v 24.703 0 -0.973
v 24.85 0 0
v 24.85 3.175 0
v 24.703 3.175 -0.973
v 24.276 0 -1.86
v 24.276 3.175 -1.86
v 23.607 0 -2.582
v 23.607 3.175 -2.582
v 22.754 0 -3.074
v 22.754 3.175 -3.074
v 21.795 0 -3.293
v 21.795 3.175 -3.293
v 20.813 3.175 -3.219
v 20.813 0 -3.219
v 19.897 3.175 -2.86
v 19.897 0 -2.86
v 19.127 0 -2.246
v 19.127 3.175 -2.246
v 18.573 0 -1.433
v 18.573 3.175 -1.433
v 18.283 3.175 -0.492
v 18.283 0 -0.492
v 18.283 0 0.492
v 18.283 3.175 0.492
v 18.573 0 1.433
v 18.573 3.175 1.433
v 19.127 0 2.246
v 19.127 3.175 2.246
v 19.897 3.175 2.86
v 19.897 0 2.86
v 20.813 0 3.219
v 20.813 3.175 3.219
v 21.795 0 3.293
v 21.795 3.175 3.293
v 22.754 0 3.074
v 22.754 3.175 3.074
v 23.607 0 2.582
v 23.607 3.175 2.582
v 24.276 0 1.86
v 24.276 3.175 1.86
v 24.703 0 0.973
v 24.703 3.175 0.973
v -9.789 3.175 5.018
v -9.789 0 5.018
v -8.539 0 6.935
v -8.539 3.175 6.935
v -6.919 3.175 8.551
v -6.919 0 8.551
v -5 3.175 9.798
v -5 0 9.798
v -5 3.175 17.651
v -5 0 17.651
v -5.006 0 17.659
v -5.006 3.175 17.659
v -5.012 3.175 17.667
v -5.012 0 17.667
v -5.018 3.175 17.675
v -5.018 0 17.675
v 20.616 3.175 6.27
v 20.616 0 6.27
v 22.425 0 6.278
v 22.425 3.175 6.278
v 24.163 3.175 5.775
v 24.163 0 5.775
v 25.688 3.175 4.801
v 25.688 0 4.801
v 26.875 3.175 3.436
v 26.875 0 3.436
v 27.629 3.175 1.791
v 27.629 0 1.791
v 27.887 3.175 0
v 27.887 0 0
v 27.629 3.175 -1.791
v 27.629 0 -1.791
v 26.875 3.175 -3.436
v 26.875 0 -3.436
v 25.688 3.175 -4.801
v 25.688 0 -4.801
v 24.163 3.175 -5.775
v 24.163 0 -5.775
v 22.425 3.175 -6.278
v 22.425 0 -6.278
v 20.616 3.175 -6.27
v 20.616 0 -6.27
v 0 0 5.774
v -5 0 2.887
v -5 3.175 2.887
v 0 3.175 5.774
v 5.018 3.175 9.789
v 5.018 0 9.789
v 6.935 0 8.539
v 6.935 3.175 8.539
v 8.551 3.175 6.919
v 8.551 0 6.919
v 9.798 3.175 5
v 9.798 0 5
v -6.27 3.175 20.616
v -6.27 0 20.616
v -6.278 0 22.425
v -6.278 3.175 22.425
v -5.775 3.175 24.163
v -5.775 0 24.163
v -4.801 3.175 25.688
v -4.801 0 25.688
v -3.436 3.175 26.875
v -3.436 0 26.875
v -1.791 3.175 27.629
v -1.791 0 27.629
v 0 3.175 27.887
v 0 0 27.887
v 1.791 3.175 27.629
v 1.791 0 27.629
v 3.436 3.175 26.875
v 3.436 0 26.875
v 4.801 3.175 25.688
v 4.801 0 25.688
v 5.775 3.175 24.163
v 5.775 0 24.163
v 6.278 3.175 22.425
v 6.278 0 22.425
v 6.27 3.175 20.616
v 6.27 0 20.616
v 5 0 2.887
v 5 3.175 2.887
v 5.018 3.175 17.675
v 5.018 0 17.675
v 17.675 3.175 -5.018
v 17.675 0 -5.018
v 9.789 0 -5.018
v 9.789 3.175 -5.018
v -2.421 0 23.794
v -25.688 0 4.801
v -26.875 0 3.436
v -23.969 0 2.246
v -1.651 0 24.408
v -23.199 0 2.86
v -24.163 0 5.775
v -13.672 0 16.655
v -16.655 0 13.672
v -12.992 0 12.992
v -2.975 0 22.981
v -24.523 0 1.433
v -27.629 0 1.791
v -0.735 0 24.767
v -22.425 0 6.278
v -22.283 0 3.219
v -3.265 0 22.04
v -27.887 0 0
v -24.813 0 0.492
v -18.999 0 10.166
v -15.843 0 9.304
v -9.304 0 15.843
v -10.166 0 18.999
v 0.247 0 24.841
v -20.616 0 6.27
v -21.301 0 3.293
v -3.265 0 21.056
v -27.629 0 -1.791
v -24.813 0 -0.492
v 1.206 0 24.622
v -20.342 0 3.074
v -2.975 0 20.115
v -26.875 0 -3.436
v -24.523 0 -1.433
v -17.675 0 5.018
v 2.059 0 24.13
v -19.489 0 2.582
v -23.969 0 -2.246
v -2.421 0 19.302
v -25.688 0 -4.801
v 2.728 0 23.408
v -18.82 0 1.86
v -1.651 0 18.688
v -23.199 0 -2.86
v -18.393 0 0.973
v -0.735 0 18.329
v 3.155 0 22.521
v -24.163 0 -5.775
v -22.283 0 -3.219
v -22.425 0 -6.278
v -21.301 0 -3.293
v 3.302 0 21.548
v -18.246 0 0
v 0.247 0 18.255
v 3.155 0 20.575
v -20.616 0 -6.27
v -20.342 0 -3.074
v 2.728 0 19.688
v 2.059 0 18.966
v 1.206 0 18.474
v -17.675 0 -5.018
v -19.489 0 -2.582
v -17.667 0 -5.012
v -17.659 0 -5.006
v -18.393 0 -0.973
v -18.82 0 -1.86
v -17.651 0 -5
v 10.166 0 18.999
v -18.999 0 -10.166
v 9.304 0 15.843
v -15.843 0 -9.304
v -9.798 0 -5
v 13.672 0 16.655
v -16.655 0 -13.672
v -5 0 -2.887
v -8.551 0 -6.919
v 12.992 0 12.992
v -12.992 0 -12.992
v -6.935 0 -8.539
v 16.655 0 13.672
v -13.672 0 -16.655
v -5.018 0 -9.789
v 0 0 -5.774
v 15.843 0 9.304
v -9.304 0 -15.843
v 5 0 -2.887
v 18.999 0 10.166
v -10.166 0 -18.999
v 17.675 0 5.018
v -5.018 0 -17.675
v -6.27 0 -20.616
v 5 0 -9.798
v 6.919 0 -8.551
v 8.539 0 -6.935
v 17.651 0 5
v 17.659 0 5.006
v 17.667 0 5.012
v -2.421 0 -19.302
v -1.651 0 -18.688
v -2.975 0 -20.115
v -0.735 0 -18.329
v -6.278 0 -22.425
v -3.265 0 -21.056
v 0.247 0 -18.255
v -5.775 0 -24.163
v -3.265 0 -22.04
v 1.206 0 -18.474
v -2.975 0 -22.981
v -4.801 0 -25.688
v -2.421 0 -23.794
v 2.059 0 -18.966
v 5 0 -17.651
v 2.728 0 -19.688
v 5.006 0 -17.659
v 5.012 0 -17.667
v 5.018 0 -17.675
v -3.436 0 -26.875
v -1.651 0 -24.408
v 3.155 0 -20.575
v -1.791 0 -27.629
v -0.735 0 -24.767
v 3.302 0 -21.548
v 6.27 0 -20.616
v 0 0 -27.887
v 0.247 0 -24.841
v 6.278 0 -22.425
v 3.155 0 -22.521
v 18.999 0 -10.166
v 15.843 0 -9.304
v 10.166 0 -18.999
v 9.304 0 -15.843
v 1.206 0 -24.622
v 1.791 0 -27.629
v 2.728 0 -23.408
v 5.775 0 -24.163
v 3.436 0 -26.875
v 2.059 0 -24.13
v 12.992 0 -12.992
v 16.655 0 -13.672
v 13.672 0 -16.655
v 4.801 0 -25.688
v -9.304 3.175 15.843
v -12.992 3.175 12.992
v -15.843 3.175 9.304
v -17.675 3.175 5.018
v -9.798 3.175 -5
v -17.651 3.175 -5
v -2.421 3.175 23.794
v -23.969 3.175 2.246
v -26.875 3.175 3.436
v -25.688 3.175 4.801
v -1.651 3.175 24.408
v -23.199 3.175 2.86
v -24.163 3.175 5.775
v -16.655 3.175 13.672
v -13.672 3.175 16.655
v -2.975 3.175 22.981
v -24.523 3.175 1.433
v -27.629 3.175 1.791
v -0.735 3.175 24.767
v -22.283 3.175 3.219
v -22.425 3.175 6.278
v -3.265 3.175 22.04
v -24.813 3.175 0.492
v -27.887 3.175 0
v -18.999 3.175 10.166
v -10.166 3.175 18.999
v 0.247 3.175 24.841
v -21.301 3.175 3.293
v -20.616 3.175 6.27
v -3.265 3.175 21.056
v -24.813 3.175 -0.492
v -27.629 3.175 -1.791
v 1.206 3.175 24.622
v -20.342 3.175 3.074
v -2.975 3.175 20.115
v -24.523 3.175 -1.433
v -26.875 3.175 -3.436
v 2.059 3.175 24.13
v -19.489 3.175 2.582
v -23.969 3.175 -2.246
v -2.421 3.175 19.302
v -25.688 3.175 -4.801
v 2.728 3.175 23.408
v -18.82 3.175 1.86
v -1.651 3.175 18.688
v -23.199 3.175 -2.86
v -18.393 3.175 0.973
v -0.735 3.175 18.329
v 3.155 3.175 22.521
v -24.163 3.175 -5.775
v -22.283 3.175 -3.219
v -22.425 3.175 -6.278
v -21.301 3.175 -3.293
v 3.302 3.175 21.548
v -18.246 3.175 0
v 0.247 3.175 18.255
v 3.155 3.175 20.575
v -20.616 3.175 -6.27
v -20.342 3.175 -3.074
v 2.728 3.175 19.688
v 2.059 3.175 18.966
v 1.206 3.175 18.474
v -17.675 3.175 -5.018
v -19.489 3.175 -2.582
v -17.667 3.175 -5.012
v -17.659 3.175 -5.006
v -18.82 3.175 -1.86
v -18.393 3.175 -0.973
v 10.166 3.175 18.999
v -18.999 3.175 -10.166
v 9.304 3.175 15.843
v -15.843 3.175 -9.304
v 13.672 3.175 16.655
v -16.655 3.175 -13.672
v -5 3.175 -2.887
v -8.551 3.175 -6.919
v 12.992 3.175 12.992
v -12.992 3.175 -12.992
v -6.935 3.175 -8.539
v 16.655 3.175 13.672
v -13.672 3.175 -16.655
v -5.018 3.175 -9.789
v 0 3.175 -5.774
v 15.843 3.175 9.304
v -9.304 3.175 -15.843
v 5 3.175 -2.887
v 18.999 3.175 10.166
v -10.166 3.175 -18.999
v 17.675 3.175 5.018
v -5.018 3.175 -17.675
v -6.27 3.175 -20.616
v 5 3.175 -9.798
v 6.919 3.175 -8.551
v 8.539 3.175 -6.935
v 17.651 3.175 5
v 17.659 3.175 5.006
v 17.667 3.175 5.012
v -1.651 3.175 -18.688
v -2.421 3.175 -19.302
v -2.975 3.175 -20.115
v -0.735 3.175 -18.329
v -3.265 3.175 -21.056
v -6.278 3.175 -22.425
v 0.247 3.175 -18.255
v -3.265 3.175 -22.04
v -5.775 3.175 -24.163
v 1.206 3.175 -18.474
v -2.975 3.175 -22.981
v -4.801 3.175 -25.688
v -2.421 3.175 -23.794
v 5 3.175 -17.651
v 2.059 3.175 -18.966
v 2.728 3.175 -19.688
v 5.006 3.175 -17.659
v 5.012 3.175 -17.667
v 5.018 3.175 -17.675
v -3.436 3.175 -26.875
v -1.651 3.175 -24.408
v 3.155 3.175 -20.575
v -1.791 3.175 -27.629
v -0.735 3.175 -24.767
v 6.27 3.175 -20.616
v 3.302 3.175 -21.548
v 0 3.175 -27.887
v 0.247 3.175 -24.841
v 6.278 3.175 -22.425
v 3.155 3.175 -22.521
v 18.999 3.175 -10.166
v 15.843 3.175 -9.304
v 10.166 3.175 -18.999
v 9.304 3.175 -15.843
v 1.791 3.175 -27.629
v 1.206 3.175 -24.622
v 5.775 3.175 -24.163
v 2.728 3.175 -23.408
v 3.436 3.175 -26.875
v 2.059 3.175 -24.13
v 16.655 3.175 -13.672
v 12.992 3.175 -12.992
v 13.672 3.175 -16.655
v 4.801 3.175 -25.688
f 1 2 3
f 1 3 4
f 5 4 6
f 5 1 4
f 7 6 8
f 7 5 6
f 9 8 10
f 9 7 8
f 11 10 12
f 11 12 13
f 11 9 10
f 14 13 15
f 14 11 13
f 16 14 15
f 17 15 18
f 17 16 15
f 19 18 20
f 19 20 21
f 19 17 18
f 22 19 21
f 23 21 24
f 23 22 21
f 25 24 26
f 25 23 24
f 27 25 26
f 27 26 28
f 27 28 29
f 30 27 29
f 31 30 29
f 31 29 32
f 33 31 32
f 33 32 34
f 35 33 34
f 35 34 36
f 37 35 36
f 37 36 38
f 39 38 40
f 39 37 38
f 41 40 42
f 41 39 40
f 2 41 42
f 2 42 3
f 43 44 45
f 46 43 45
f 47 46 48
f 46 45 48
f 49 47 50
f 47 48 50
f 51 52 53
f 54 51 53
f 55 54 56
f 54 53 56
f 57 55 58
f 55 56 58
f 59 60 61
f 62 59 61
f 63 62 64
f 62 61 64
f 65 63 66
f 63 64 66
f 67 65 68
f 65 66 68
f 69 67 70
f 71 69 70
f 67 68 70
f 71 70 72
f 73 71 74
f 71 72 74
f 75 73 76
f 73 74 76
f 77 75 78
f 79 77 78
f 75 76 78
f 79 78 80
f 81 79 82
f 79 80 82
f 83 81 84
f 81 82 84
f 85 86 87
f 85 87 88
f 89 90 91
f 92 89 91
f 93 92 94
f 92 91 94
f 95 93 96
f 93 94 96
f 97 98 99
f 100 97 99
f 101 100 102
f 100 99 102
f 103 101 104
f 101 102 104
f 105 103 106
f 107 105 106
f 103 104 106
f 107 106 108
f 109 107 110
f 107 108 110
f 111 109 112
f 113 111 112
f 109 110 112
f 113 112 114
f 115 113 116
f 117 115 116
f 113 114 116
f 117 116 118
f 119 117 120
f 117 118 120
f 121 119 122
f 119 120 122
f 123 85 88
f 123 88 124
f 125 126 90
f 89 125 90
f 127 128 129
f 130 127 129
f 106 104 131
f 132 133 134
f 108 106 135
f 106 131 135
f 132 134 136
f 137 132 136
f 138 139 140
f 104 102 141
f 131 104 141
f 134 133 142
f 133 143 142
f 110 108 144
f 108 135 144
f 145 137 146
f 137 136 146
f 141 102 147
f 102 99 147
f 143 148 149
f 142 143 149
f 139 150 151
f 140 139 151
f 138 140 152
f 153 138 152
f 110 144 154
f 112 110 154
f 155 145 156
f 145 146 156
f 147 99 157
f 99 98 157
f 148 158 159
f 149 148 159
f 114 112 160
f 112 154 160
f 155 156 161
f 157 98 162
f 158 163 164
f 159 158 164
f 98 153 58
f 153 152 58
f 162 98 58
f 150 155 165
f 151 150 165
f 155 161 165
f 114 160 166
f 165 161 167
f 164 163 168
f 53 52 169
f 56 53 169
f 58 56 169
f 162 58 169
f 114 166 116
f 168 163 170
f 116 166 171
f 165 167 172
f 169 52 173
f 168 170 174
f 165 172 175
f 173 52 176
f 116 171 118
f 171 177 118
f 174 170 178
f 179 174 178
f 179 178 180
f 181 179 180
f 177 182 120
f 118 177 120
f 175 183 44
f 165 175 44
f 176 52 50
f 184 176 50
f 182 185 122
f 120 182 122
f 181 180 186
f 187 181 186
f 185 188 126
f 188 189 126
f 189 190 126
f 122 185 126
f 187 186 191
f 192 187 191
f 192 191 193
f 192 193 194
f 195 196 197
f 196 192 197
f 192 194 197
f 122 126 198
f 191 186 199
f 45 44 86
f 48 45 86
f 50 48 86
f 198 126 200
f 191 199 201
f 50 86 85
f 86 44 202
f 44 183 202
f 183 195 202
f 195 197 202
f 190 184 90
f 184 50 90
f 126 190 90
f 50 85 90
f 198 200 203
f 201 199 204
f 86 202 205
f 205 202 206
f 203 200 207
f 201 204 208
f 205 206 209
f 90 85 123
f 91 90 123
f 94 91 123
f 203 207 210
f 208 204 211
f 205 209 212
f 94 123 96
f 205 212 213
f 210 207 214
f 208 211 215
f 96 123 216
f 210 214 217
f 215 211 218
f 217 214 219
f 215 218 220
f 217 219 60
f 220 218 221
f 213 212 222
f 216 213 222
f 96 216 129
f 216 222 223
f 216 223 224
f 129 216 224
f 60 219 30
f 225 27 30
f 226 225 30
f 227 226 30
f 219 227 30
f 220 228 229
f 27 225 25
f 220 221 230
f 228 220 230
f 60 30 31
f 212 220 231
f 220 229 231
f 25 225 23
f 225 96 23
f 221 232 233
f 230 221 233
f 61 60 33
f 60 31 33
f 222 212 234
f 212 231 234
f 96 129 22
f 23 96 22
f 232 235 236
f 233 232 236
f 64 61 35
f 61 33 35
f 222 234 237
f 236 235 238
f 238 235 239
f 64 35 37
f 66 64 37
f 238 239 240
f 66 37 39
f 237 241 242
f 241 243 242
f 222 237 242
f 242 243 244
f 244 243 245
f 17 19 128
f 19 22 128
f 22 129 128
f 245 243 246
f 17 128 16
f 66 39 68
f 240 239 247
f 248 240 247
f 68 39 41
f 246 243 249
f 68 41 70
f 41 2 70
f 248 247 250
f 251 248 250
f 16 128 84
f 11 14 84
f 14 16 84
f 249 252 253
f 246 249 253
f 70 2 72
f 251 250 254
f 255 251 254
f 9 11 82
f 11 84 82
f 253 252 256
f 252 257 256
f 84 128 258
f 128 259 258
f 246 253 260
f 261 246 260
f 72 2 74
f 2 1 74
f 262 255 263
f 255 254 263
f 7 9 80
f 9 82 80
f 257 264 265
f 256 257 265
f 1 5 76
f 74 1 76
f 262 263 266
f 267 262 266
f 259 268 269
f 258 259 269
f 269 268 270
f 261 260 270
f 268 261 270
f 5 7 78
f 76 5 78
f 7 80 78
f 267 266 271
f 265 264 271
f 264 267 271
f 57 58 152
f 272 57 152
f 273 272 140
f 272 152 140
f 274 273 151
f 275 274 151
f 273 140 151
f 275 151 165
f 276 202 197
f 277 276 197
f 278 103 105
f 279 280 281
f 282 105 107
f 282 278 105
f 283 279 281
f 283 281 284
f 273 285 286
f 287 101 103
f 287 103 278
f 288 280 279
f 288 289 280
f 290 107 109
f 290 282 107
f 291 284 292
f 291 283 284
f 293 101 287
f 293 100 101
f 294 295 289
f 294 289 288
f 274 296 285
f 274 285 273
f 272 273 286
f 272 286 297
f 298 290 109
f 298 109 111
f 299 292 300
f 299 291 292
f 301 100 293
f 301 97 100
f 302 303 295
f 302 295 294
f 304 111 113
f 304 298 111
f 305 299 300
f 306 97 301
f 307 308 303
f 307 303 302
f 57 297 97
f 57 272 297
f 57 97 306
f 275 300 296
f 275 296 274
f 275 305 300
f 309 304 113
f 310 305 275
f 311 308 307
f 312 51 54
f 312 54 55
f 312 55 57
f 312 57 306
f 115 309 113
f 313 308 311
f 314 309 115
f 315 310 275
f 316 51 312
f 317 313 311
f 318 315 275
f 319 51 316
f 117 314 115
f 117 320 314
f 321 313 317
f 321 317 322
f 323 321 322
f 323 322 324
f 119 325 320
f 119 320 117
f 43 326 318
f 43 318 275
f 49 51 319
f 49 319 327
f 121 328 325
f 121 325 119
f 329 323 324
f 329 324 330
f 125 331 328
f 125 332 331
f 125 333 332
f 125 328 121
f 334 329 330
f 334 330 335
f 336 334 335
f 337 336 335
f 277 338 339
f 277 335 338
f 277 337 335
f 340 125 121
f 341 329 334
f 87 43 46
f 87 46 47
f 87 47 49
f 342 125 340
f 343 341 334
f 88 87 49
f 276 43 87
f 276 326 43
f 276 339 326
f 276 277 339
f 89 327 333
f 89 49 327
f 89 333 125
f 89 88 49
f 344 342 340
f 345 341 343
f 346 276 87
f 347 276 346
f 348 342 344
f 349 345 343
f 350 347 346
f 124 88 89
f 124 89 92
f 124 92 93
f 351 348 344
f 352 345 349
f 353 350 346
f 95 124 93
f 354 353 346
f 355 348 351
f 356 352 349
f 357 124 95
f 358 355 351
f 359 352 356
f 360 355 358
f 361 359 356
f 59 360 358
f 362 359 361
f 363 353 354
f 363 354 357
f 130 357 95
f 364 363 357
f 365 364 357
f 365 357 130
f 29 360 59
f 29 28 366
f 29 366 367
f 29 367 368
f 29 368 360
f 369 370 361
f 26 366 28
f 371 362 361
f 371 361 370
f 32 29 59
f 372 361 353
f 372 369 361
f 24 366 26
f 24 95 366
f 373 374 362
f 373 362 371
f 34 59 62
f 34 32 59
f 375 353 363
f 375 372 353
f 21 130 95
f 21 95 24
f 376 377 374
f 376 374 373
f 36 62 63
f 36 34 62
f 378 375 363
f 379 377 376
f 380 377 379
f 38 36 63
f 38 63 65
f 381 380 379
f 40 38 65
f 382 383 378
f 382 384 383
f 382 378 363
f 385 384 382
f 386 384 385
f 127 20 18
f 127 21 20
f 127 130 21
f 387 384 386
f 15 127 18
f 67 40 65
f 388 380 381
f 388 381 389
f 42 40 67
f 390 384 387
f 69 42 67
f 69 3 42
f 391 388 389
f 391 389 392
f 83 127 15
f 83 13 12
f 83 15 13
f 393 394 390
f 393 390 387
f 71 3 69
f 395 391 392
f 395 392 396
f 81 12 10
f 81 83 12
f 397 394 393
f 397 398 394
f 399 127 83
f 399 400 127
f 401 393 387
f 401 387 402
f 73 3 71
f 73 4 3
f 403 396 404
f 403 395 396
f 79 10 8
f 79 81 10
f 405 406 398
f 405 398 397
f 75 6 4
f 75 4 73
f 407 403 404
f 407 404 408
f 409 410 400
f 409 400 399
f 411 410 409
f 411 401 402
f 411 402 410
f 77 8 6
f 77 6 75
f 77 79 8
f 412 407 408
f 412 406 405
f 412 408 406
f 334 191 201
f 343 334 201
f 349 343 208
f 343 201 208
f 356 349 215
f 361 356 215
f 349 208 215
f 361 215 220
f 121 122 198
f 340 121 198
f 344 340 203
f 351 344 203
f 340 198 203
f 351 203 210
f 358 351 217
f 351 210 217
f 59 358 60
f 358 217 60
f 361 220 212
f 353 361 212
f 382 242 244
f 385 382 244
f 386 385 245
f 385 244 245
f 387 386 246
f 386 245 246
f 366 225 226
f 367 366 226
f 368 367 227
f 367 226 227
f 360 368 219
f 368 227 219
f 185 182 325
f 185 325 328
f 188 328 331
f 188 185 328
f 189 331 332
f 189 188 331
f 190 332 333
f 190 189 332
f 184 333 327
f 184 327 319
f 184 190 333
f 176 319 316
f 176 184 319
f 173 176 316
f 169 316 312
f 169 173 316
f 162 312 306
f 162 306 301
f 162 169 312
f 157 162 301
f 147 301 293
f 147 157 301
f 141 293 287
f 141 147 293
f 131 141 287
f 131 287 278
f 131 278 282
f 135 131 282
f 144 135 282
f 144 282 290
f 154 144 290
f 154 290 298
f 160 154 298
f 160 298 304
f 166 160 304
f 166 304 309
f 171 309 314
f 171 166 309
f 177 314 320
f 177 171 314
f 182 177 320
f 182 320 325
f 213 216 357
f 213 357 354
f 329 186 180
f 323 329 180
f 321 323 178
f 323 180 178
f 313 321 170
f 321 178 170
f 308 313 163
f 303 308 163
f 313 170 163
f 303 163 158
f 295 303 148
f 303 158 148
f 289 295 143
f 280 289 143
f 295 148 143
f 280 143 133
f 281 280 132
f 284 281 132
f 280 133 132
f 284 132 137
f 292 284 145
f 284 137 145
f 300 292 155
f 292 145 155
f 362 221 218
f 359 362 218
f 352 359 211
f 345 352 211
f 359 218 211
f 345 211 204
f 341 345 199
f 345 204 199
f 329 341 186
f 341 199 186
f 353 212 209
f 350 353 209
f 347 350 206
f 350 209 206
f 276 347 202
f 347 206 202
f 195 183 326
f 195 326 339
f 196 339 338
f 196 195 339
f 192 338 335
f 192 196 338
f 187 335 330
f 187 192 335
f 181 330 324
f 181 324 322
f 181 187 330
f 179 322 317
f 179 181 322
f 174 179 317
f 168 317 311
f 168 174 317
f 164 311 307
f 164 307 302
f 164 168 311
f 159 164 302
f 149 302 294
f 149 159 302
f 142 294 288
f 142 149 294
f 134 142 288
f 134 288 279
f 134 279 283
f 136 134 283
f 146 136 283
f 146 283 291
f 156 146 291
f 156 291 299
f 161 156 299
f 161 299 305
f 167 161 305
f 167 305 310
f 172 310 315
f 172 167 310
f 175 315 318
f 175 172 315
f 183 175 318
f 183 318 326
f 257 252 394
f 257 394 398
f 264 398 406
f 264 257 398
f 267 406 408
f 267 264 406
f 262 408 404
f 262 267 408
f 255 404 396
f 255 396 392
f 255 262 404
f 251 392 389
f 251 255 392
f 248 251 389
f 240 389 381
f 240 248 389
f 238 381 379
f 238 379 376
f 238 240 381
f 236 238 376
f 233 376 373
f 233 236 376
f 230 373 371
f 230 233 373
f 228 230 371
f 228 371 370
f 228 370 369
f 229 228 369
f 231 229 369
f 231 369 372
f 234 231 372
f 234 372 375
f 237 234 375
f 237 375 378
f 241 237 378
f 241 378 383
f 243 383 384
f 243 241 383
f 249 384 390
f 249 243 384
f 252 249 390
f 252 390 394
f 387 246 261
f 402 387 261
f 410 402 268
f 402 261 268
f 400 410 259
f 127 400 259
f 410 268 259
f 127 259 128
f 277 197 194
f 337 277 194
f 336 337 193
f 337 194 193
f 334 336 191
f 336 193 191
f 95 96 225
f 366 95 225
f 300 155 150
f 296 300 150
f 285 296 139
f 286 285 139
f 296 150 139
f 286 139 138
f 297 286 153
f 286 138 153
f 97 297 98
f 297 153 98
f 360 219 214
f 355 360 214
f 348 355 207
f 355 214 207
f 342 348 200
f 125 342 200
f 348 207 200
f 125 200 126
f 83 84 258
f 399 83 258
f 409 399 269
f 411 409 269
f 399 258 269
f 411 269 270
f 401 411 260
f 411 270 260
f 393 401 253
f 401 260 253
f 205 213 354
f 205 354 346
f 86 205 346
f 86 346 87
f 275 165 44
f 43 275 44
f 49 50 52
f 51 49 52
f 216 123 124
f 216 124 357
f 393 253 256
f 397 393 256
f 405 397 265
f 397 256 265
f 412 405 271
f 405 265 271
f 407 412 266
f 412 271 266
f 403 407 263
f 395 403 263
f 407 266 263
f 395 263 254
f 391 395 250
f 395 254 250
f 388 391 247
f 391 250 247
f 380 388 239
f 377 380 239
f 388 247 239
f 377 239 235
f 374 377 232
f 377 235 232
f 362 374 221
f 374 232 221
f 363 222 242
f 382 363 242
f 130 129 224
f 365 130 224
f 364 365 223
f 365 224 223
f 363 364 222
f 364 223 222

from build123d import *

# Parameters (mm, degrees)
SKETCH1_R           = 6.339
SKETCH1_R_2         = 3.302
SKETCH1_R_3         = 11
BOSS_EXTRUDE1_DEPTH = 3.175


with BuildPart() as part:
    # Sketch1 → Boss-Extrude1 (new body)
    with BuildSketch(Plane(origin=(0, 0, 0), x_dir=(1, 0, 0), z_dir=(0, 1, 0))):
        with BuildLine():
            ThreePointArc((-17.674506033, 5.017864634), (-12.991672891, 12.991672891), (-5.017864634, 17.674506033))
            ThreePointArc((-5.017864634, 17.674506033), (-5.832389069, 19.064824865), (-6.270051206, 20.615595113))
            ThreePointArc((-6.270051206, 20.615595113), (-15.236736921, 15.236736921), (-20.615595113, 6.270051206))
            ThreePointArc((-20.615595113, 6.270051206), (-19.064824865, 5.832389069), (-17.674506033, 5.017864634))
        make_face()
        with Locations((-21.548, 0)):
            Circle(SKETCH1_R)
        with Locations((-21.548, 0)):
            Circle(SKETCH1_R_2, mode=Mode.SUBTRACT)
        with BuildLine():
            ThreePointArc((-17.674506033, -5.017864634), (-19.064824865, -5.832389069), (-20.615595113, -6.270051206))
            ThreePointArc((-20.615595113, -6.270051206), (-15.236736921, -15.236736921), (-6.270051206, -20.615595113))
            ThreePointArc((-6.270051206, -20.615595113), (-5.832389069, -19.064824865), (-5.017864634, -17.674506033))
            ThreePointArc((-5.017864634, -17.674506033), (-12.991672891, -12.991672891), (-17.674506033, -5.017864634))
        make_face()
        with Locations((0, -21.548)):
            Circle(SKETCH1_R)
        with Locations((0, -21.548)):
            Circle(SKETCH1_R_2, mode=Mode.SUBTRACT)
        with BuildLine():
            ThreePointArc((-9.788821916, -5.017864634), (-10.999995425, -0.010032833), (-9.797958971, 5))
            Line((-9.797958971, 5), (-17.651473213, 5))
            ThreePointArc((-17.651473213, 5), (-15.852255786, 2.782340534), (-15.209, 0))
            ThreePointArc((-15.209, 0), (-15.85866791, -2.795428656), (-17.674506033, -5.017864634))
            Line((-17.674506033, -5.017864634), (-9.788821916, -5.017864634))
        make_face()
        with BuildLine():
            ThreePointArc((5.017864634, -9.788821916), (0.010032833, -10.999995425), (-5, -9.797958971))
            Line((-5, -9.797958971), (-5, -17.651473213))
            ThreePointArc((-5, -17.651473213), (0.014574429, -15.209016755), (5.017864634, -17.674506033))
            Line((5.017864634, -17.674506033), (5.017864634, -9.788821916))
        make_face()
        Circle(SKETCH1_R_3)
        Polygon((5, 2.886751346), (0, 5.773502692), (-5, 2.886751346), (-5, -2.886751346), (0, -5.773502692), (5, -2.886751346), align=None, mode=Mode.SUBTRACT)
        with BuildLine():
            ThreePointArc((5, 17.651473213), (-0.014574429, 15.209016755), (-5.017864634, 17.674506033))
            Line((-5.017864634, 17.674506033), (-5.017864634, 9.788821916))
            ThreePointArc((-5.017864634, 9.788821916), (-0.010032833, 10.999995425), (5, 9.797958971))
            Line((5, 9.797958971), (5, 17.651473213))
        make_face()
        with Locations((0, 21.548)):
            Circle(SKETCH1_R)
        with Locations((0, 21.548)):
            Circle(SKETCH1_R_2, mode=Mode.SUBTRACT)
        with BuildLine():
            ThreePointArc((6.270051206, 20.615595113), (5.832389069, 19.064824865), (5.017864634, 17.674506033))
            ThreePointArc((5.017864634, 17.674506033), (12.991672891, 12.991672891), (17.674506033, 5.017864634))
            ThreePointArc((17.674506033, 5.017864634), (19.064824865, 5.832389069), (20.615595113, 6.270051206))
            ThreePointArc((20.615595113, 6.270051206), (15.236736921, 15.236736921), (6.270051206, 20.615595113))
        make_face()
        with BuildLine():
            Line((17.674506033, 5.017864634), (9.788821916, 5.017864634))
            ThreePointArc((9.788821916, 5.017864634), (10.692919178, 2.580984204), (11, 0))
            ThreePointArc((11, 0), (10.695268783, -2.571230378), (9.797958971, -5))
            Line((9.797958971, -5), (17.651473213, -5))
            ThreePointArc((17.651473213, -5), (15.209016755, 0.014574429), (17.674506033, 5.017864634))
        make_face()
        with Locations((21.548, 0)):
            Circle(SKETCH1_R)
        with Locations((21.548, 0)):
            Circle(SKETCH1_R_2, mode=Mode.SUBTRACT)
        with BuildLine():
            ThreePointArc((20.615595113, -6.270051206), (19.064824865, -5.832389069), (17.674506033, -5.017864634))
            ThreePointArc((17.674506033, -5.017864634), (12.991672891, -12.991672891), (5.017864634, -17.674506033))
            ThreePointArc((5.017864634, -17.674506033), (5.832389069, -19.064824865), (6.270051206, -20.615595113))
            ThreePointArc((6.270051206, -20.615595113), (15.236736921, -15.236736921), (20.615595113, -6.270051206))
        make_face()
    extrude(amount=BOSS_EXTRUDE1_DEPTH)


solid = part.part
